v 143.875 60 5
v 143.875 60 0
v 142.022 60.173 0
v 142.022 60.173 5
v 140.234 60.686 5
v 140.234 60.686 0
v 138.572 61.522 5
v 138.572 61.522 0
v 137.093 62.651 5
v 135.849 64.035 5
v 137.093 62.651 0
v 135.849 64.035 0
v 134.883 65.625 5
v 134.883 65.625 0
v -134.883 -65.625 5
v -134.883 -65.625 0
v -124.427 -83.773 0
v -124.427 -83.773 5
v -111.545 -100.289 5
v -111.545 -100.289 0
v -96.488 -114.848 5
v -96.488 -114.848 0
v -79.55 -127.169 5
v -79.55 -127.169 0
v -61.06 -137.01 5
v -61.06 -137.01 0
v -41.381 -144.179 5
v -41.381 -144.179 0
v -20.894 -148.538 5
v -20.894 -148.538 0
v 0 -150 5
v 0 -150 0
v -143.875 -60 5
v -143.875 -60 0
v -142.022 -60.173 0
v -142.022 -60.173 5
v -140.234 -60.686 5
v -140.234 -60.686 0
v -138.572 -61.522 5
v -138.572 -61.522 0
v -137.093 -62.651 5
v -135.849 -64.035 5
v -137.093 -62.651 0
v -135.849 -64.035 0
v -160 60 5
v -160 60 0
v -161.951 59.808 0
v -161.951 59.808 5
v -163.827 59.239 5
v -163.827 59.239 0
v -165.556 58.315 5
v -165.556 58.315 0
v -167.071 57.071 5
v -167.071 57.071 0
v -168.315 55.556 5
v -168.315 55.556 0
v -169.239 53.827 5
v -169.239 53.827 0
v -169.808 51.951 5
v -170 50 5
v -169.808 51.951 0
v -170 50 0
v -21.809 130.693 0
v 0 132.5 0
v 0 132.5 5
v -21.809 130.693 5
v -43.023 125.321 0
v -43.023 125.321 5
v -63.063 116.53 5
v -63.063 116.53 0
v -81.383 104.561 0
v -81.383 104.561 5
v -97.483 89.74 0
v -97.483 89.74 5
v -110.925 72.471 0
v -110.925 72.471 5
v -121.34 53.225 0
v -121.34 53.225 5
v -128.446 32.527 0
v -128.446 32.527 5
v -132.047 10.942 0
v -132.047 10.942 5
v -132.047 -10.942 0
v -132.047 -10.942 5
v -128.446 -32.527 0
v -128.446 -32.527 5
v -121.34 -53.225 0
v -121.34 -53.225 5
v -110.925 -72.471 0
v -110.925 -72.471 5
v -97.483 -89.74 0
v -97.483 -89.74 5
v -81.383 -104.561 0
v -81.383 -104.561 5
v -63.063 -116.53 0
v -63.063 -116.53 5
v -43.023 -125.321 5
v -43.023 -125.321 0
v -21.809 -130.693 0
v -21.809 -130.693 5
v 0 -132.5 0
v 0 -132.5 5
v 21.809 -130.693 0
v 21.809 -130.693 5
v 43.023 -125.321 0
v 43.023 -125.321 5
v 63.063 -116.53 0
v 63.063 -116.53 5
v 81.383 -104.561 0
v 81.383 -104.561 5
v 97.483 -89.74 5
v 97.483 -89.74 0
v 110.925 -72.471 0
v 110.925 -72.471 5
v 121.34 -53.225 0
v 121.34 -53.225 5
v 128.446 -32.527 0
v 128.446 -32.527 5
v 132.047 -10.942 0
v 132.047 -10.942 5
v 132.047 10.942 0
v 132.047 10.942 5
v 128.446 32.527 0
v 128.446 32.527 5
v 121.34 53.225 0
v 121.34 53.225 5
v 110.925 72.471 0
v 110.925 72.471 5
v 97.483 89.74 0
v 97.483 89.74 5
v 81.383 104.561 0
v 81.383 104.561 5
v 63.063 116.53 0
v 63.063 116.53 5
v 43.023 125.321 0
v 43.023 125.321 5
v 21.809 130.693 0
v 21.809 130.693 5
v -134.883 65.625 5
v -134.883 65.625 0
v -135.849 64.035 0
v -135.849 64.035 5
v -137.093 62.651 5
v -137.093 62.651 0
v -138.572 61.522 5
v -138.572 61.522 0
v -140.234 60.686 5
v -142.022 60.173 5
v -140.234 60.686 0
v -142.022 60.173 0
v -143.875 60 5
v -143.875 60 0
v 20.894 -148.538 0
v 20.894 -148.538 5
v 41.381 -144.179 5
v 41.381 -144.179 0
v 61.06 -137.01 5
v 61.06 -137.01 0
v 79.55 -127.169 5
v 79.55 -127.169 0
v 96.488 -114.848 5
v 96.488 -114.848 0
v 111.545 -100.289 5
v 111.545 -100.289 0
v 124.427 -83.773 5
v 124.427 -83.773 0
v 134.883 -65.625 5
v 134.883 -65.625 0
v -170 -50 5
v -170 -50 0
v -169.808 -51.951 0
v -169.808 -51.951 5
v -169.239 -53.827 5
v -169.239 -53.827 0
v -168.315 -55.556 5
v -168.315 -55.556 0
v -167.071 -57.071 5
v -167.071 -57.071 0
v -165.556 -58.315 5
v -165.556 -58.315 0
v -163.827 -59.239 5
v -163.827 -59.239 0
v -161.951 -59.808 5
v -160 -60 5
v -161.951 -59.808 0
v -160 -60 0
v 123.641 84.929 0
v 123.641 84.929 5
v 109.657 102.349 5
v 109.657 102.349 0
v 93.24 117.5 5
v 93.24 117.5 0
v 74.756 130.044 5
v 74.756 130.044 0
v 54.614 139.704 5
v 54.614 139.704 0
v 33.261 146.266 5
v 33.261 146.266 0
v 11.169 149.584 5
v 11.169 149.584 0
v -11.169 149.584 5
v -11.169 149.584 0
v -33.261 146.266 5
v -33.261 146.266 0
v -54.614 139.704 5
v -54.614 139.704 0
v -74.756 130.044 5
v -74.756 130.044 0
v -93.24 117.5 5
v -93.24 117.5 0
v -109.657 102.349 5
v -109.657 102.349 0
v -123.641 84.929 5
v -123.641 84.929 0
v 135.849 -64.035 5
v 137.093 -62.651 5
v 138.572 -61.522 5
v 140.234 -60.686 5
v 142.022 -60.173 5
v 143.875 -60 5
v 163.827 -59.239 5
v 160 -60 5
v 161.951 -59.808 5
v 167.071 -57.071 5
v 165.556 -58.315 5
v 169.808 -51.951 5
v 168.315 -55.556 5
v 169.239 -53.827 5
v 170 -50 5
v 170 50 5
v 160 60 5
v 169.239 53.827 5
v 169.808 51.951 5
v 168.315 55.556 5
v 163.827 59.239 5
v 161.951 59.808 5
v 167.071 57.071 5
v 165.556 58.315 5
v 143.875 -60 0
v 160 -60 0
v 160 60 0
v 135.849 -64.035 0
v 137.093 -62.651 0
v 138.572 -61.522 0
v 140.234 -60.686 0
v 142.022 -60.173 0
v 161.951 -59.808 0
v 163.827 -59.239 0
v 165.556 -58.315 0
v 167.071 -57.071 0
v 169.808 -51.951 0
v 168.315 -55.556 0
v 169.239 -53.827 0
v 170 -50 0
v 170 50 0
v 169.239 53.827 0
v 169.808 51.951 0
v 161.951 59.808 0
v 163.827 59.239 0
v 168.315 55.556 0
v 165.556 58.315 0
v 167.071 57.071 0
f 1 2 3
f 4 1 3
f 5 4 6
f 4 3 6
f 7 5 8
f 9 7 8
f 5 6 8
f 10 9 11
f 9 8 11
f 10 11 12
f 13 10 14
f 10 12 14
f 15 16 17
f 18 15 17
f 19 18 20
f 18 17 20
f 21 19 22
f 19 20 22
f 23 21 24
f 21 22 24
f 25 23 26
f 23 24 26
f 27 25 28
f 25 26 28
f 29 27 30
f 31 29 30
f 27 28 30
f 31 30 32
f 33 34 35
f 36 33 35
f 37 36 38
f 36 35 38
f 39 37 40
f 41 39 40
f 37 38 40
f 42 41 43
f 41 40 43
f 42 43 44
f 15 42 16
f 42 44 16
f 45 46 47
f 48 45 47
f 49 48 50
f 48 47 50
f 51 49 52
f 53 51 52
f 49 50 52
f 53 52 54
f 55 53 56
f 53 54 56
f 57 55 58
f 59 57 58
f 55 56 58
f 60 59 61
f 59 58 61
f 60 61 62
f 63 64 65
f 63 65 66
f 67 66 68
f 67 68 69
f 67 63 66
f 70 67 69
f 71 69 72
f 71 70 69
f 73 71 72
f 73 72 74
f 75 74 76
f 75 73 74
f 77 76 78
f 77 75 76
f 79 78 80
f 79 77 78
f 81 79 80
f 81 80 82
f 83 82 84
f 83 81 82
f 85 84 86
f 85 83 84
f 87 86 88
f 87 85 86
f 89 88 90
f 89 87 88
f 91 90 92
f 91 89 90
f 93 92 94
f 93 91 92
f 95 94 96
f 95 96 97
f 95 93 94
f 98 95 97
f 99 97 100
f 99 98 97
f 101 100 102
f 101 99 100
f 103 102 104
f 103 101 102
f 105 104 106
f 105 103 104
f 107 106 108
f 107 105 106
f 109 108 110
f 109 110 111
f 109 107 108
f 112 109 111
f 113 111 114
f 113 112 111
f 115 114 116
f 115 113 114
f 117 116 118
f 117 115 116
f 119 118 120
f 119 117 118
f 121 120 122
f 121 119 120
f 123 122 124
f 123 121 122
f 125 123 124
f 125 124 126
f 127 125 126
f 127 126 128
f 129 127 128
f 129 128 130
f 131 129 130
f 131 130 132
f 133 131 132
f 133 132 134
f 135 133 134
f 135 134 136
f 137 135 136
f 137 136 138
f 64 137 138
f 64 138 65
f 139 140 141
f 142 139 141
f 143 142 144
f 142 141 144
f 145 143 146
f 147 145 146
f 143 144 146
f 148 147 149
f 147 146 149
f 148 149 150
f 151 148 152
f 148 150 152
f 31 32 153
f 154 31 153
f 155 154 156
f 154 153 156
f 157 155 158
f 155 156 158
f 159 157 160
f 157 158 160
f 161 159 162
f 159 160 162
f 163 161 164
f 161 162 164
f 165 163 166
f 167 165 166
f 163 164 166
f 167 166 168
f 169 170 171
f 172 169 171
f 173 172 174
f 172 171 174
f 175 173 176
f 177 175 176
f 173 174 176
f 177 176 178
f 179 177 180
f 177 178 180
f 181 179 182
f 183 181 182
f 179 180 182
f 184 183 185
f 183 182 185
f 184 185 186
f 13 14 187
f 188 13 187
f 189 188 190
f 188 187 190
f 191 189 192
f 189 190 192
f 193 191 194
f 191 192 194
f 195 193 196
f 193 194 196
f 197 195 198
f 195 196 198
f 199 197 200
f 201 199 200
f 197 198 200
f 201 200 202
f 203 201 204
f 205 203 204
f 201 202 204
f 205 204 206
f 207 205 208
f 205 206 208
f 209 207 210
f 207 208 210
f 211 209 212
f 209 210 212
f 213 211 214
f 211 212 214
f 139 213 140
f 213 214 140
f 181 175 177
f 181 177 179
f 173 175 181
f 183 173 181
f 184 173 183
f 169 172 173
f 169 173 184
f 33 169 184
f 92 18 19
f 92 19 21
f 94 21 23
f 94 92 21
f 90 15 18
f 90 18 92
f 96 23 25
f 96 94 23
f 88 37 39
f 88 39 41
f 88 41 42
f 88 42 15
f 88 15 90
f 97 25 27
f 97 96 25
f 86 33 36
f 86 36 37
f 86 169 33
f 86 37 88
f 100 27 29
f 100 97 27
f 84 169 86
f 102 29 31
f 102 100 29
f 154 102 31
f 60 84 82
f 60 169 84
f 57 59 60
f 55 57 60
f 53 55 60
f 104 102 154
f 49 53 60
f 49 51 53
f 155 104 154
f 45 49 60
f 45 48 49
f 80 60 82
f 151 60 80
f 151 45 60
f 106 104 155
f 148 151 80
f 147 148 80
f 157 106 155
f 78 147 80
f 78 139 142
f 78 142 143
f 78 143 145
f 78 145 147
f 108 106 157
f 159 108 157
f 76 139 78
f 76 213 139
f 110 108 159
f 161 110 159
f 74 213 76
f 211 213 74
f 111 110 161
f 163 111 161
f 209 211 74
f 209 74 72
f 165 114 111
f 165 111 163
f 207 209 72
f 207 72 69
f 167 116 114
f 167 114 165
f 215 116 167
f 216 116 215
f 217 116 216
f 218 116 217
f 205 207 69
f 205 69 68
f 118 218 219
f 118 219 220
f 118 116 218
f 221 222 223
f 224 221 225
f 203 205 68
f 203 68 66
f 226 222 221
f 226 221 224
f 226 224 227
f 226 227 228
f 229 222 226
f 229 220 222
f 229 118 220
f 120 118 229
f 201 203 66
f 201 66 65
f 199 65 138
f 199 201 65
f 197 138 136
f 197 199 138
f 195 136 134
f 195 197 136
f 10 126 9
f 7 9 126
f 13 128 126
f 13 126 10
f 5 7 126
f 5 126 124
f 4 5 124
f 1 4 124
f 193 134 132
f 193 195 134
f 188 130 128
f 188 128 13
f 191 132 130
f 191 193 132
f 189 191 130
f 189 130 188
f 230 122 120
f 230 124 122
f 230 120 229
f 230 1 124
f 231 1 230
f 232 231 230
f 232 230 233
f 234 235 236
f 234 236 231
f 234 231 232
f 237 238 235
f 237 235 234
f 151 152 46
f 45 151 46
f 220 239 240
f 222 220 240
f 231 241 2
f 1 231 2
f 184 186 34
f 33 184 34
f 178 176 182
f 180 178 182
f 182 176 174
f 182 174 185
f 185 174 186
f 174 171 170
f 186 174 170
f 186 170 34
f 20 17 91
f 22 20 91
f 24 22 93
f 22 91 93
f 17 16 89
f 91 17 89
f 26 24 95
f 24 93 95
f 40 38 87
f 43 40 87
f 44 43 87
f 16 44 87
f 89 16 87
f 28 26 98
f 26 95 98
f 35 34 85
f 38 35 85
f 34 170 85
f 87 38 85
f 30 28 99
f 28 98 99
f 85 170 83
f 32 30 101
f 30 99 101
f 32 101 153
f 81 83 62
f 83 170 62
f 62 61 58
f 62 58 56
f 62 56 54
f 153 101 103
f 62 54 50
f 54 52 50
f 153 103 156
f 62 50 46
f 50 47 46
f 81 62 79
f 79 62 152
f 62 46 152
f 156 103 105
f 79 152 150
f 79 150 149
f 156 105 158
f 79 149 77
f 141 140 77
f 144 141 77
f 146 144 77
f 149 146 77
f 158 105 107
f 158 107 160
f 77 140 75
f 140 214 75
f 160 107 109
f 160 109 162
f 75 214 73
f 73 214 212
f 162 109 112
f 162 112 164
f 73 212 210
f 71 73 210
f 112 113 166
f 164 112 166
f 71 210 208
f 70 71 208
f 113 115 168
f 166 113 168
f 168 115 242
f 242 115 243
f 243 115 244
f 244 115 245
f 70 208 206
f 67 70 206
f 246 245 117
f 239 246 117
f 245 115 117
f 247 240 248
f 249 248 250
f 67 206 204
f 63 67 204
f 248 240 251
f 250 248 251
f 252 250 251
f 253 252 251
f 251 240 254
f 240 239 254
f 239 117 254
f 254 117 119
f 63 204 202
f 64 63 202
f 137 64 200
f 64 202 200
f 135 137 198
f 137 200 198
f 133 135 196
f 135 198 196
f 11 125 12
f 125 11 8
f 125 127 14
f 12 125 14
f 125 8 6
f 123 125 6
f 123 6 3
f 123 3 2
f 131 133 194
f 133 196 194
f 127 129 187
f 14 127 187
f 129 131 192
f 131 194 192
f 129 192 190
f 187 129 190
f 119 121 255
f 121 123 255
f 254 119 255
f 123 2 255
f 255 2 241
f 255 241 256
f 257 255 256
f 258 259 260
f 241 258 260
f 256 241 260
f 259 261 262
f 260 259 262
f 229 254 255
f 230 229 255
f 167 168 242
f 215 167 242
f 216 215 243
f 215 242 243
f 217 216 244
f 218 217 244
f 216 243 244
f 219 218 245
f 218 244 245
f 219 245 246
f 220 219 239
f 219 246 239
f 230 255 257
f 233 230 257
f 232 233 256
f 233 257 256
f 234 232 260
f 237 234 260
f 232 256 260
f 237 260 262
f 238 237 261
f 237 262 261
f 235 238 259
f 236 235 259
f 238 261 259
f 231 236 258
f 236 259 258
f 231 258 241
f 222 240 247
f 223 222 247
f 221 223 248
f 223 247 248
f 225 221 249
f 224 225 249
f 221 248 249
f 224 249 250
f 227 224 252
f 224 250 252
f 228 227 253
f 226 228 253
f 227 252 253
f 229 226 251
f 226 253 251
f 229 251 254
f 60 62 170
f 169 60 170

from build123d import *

# Parameters (mm, degrees)
EXTRUDE_2_DEPTH = 5


with BuildPart() as part:
    # 草图1 → 凸台-拉伸2 (new body)
    with BuildSketch(Plane.XY):
        with BuildLine():
            Line((-170, 50), (-170, -50))
            ThreePointArc((-170, -50), (-167.071067812, -57.071067812), (-160, -60))
            Line((-160, -60), (-143.874945699, -60))
            ThreePointArc((-143.874945699, -60), (-138.57164484, -61.522087521), (-134.882761593, -65.625))
            ThreePointArc((-134.882761593, -65.625), (-79.549512883, -127.168687184), (0, -150))
            ThreePointArc((0, -150), (79.549512883, -127.168687184), (134.882761593, -65.625))
            ThreePointArc((134.882761593, -65.625), (138.57164484, -61.522087521), (143.874945699, -60))
            Line((143.874945699, -60), (160, -60))
            ThreePointArc((160, -60), (167.071067812, -57.071067812), (170, -50))
            Line((170, -50), (170, 50))
            ThreePointArc((170, 50), (167.071067812, 57.071067812), (160, 60))
            Line((160, 60), (143.874945699, 60))
            ThreePointArc((143.874945699, 60), (138.57164484, 61.522087521), (134.882761593, 65.625))
            ThreePointArc((134.882761593, 65.625), (0, 150), (-134.882761593, 65.625))
            ThreePointArc((-134.882761593, 65.625), (-138.57164484, 61.522087521), (-143.874945699, 60))
            Line((-143.874945699, 60), (-160, 60))
            ThreePointArc((-160, 60), (-167.071067812, 57.071067812), (-170, 50))
        make_face()
        with BuildLine():
            ThreePointArc((0, -132.5), (132.5, 0), (0, 132.5))
            ThreePointArc((0, 132.5), (-132.5, 0), (0, -132.5))
        make_face(mode=Mode.SUBTRACT)
    extrude(amount=EXTRUDE_2_DEPTH)


solid = part.part
